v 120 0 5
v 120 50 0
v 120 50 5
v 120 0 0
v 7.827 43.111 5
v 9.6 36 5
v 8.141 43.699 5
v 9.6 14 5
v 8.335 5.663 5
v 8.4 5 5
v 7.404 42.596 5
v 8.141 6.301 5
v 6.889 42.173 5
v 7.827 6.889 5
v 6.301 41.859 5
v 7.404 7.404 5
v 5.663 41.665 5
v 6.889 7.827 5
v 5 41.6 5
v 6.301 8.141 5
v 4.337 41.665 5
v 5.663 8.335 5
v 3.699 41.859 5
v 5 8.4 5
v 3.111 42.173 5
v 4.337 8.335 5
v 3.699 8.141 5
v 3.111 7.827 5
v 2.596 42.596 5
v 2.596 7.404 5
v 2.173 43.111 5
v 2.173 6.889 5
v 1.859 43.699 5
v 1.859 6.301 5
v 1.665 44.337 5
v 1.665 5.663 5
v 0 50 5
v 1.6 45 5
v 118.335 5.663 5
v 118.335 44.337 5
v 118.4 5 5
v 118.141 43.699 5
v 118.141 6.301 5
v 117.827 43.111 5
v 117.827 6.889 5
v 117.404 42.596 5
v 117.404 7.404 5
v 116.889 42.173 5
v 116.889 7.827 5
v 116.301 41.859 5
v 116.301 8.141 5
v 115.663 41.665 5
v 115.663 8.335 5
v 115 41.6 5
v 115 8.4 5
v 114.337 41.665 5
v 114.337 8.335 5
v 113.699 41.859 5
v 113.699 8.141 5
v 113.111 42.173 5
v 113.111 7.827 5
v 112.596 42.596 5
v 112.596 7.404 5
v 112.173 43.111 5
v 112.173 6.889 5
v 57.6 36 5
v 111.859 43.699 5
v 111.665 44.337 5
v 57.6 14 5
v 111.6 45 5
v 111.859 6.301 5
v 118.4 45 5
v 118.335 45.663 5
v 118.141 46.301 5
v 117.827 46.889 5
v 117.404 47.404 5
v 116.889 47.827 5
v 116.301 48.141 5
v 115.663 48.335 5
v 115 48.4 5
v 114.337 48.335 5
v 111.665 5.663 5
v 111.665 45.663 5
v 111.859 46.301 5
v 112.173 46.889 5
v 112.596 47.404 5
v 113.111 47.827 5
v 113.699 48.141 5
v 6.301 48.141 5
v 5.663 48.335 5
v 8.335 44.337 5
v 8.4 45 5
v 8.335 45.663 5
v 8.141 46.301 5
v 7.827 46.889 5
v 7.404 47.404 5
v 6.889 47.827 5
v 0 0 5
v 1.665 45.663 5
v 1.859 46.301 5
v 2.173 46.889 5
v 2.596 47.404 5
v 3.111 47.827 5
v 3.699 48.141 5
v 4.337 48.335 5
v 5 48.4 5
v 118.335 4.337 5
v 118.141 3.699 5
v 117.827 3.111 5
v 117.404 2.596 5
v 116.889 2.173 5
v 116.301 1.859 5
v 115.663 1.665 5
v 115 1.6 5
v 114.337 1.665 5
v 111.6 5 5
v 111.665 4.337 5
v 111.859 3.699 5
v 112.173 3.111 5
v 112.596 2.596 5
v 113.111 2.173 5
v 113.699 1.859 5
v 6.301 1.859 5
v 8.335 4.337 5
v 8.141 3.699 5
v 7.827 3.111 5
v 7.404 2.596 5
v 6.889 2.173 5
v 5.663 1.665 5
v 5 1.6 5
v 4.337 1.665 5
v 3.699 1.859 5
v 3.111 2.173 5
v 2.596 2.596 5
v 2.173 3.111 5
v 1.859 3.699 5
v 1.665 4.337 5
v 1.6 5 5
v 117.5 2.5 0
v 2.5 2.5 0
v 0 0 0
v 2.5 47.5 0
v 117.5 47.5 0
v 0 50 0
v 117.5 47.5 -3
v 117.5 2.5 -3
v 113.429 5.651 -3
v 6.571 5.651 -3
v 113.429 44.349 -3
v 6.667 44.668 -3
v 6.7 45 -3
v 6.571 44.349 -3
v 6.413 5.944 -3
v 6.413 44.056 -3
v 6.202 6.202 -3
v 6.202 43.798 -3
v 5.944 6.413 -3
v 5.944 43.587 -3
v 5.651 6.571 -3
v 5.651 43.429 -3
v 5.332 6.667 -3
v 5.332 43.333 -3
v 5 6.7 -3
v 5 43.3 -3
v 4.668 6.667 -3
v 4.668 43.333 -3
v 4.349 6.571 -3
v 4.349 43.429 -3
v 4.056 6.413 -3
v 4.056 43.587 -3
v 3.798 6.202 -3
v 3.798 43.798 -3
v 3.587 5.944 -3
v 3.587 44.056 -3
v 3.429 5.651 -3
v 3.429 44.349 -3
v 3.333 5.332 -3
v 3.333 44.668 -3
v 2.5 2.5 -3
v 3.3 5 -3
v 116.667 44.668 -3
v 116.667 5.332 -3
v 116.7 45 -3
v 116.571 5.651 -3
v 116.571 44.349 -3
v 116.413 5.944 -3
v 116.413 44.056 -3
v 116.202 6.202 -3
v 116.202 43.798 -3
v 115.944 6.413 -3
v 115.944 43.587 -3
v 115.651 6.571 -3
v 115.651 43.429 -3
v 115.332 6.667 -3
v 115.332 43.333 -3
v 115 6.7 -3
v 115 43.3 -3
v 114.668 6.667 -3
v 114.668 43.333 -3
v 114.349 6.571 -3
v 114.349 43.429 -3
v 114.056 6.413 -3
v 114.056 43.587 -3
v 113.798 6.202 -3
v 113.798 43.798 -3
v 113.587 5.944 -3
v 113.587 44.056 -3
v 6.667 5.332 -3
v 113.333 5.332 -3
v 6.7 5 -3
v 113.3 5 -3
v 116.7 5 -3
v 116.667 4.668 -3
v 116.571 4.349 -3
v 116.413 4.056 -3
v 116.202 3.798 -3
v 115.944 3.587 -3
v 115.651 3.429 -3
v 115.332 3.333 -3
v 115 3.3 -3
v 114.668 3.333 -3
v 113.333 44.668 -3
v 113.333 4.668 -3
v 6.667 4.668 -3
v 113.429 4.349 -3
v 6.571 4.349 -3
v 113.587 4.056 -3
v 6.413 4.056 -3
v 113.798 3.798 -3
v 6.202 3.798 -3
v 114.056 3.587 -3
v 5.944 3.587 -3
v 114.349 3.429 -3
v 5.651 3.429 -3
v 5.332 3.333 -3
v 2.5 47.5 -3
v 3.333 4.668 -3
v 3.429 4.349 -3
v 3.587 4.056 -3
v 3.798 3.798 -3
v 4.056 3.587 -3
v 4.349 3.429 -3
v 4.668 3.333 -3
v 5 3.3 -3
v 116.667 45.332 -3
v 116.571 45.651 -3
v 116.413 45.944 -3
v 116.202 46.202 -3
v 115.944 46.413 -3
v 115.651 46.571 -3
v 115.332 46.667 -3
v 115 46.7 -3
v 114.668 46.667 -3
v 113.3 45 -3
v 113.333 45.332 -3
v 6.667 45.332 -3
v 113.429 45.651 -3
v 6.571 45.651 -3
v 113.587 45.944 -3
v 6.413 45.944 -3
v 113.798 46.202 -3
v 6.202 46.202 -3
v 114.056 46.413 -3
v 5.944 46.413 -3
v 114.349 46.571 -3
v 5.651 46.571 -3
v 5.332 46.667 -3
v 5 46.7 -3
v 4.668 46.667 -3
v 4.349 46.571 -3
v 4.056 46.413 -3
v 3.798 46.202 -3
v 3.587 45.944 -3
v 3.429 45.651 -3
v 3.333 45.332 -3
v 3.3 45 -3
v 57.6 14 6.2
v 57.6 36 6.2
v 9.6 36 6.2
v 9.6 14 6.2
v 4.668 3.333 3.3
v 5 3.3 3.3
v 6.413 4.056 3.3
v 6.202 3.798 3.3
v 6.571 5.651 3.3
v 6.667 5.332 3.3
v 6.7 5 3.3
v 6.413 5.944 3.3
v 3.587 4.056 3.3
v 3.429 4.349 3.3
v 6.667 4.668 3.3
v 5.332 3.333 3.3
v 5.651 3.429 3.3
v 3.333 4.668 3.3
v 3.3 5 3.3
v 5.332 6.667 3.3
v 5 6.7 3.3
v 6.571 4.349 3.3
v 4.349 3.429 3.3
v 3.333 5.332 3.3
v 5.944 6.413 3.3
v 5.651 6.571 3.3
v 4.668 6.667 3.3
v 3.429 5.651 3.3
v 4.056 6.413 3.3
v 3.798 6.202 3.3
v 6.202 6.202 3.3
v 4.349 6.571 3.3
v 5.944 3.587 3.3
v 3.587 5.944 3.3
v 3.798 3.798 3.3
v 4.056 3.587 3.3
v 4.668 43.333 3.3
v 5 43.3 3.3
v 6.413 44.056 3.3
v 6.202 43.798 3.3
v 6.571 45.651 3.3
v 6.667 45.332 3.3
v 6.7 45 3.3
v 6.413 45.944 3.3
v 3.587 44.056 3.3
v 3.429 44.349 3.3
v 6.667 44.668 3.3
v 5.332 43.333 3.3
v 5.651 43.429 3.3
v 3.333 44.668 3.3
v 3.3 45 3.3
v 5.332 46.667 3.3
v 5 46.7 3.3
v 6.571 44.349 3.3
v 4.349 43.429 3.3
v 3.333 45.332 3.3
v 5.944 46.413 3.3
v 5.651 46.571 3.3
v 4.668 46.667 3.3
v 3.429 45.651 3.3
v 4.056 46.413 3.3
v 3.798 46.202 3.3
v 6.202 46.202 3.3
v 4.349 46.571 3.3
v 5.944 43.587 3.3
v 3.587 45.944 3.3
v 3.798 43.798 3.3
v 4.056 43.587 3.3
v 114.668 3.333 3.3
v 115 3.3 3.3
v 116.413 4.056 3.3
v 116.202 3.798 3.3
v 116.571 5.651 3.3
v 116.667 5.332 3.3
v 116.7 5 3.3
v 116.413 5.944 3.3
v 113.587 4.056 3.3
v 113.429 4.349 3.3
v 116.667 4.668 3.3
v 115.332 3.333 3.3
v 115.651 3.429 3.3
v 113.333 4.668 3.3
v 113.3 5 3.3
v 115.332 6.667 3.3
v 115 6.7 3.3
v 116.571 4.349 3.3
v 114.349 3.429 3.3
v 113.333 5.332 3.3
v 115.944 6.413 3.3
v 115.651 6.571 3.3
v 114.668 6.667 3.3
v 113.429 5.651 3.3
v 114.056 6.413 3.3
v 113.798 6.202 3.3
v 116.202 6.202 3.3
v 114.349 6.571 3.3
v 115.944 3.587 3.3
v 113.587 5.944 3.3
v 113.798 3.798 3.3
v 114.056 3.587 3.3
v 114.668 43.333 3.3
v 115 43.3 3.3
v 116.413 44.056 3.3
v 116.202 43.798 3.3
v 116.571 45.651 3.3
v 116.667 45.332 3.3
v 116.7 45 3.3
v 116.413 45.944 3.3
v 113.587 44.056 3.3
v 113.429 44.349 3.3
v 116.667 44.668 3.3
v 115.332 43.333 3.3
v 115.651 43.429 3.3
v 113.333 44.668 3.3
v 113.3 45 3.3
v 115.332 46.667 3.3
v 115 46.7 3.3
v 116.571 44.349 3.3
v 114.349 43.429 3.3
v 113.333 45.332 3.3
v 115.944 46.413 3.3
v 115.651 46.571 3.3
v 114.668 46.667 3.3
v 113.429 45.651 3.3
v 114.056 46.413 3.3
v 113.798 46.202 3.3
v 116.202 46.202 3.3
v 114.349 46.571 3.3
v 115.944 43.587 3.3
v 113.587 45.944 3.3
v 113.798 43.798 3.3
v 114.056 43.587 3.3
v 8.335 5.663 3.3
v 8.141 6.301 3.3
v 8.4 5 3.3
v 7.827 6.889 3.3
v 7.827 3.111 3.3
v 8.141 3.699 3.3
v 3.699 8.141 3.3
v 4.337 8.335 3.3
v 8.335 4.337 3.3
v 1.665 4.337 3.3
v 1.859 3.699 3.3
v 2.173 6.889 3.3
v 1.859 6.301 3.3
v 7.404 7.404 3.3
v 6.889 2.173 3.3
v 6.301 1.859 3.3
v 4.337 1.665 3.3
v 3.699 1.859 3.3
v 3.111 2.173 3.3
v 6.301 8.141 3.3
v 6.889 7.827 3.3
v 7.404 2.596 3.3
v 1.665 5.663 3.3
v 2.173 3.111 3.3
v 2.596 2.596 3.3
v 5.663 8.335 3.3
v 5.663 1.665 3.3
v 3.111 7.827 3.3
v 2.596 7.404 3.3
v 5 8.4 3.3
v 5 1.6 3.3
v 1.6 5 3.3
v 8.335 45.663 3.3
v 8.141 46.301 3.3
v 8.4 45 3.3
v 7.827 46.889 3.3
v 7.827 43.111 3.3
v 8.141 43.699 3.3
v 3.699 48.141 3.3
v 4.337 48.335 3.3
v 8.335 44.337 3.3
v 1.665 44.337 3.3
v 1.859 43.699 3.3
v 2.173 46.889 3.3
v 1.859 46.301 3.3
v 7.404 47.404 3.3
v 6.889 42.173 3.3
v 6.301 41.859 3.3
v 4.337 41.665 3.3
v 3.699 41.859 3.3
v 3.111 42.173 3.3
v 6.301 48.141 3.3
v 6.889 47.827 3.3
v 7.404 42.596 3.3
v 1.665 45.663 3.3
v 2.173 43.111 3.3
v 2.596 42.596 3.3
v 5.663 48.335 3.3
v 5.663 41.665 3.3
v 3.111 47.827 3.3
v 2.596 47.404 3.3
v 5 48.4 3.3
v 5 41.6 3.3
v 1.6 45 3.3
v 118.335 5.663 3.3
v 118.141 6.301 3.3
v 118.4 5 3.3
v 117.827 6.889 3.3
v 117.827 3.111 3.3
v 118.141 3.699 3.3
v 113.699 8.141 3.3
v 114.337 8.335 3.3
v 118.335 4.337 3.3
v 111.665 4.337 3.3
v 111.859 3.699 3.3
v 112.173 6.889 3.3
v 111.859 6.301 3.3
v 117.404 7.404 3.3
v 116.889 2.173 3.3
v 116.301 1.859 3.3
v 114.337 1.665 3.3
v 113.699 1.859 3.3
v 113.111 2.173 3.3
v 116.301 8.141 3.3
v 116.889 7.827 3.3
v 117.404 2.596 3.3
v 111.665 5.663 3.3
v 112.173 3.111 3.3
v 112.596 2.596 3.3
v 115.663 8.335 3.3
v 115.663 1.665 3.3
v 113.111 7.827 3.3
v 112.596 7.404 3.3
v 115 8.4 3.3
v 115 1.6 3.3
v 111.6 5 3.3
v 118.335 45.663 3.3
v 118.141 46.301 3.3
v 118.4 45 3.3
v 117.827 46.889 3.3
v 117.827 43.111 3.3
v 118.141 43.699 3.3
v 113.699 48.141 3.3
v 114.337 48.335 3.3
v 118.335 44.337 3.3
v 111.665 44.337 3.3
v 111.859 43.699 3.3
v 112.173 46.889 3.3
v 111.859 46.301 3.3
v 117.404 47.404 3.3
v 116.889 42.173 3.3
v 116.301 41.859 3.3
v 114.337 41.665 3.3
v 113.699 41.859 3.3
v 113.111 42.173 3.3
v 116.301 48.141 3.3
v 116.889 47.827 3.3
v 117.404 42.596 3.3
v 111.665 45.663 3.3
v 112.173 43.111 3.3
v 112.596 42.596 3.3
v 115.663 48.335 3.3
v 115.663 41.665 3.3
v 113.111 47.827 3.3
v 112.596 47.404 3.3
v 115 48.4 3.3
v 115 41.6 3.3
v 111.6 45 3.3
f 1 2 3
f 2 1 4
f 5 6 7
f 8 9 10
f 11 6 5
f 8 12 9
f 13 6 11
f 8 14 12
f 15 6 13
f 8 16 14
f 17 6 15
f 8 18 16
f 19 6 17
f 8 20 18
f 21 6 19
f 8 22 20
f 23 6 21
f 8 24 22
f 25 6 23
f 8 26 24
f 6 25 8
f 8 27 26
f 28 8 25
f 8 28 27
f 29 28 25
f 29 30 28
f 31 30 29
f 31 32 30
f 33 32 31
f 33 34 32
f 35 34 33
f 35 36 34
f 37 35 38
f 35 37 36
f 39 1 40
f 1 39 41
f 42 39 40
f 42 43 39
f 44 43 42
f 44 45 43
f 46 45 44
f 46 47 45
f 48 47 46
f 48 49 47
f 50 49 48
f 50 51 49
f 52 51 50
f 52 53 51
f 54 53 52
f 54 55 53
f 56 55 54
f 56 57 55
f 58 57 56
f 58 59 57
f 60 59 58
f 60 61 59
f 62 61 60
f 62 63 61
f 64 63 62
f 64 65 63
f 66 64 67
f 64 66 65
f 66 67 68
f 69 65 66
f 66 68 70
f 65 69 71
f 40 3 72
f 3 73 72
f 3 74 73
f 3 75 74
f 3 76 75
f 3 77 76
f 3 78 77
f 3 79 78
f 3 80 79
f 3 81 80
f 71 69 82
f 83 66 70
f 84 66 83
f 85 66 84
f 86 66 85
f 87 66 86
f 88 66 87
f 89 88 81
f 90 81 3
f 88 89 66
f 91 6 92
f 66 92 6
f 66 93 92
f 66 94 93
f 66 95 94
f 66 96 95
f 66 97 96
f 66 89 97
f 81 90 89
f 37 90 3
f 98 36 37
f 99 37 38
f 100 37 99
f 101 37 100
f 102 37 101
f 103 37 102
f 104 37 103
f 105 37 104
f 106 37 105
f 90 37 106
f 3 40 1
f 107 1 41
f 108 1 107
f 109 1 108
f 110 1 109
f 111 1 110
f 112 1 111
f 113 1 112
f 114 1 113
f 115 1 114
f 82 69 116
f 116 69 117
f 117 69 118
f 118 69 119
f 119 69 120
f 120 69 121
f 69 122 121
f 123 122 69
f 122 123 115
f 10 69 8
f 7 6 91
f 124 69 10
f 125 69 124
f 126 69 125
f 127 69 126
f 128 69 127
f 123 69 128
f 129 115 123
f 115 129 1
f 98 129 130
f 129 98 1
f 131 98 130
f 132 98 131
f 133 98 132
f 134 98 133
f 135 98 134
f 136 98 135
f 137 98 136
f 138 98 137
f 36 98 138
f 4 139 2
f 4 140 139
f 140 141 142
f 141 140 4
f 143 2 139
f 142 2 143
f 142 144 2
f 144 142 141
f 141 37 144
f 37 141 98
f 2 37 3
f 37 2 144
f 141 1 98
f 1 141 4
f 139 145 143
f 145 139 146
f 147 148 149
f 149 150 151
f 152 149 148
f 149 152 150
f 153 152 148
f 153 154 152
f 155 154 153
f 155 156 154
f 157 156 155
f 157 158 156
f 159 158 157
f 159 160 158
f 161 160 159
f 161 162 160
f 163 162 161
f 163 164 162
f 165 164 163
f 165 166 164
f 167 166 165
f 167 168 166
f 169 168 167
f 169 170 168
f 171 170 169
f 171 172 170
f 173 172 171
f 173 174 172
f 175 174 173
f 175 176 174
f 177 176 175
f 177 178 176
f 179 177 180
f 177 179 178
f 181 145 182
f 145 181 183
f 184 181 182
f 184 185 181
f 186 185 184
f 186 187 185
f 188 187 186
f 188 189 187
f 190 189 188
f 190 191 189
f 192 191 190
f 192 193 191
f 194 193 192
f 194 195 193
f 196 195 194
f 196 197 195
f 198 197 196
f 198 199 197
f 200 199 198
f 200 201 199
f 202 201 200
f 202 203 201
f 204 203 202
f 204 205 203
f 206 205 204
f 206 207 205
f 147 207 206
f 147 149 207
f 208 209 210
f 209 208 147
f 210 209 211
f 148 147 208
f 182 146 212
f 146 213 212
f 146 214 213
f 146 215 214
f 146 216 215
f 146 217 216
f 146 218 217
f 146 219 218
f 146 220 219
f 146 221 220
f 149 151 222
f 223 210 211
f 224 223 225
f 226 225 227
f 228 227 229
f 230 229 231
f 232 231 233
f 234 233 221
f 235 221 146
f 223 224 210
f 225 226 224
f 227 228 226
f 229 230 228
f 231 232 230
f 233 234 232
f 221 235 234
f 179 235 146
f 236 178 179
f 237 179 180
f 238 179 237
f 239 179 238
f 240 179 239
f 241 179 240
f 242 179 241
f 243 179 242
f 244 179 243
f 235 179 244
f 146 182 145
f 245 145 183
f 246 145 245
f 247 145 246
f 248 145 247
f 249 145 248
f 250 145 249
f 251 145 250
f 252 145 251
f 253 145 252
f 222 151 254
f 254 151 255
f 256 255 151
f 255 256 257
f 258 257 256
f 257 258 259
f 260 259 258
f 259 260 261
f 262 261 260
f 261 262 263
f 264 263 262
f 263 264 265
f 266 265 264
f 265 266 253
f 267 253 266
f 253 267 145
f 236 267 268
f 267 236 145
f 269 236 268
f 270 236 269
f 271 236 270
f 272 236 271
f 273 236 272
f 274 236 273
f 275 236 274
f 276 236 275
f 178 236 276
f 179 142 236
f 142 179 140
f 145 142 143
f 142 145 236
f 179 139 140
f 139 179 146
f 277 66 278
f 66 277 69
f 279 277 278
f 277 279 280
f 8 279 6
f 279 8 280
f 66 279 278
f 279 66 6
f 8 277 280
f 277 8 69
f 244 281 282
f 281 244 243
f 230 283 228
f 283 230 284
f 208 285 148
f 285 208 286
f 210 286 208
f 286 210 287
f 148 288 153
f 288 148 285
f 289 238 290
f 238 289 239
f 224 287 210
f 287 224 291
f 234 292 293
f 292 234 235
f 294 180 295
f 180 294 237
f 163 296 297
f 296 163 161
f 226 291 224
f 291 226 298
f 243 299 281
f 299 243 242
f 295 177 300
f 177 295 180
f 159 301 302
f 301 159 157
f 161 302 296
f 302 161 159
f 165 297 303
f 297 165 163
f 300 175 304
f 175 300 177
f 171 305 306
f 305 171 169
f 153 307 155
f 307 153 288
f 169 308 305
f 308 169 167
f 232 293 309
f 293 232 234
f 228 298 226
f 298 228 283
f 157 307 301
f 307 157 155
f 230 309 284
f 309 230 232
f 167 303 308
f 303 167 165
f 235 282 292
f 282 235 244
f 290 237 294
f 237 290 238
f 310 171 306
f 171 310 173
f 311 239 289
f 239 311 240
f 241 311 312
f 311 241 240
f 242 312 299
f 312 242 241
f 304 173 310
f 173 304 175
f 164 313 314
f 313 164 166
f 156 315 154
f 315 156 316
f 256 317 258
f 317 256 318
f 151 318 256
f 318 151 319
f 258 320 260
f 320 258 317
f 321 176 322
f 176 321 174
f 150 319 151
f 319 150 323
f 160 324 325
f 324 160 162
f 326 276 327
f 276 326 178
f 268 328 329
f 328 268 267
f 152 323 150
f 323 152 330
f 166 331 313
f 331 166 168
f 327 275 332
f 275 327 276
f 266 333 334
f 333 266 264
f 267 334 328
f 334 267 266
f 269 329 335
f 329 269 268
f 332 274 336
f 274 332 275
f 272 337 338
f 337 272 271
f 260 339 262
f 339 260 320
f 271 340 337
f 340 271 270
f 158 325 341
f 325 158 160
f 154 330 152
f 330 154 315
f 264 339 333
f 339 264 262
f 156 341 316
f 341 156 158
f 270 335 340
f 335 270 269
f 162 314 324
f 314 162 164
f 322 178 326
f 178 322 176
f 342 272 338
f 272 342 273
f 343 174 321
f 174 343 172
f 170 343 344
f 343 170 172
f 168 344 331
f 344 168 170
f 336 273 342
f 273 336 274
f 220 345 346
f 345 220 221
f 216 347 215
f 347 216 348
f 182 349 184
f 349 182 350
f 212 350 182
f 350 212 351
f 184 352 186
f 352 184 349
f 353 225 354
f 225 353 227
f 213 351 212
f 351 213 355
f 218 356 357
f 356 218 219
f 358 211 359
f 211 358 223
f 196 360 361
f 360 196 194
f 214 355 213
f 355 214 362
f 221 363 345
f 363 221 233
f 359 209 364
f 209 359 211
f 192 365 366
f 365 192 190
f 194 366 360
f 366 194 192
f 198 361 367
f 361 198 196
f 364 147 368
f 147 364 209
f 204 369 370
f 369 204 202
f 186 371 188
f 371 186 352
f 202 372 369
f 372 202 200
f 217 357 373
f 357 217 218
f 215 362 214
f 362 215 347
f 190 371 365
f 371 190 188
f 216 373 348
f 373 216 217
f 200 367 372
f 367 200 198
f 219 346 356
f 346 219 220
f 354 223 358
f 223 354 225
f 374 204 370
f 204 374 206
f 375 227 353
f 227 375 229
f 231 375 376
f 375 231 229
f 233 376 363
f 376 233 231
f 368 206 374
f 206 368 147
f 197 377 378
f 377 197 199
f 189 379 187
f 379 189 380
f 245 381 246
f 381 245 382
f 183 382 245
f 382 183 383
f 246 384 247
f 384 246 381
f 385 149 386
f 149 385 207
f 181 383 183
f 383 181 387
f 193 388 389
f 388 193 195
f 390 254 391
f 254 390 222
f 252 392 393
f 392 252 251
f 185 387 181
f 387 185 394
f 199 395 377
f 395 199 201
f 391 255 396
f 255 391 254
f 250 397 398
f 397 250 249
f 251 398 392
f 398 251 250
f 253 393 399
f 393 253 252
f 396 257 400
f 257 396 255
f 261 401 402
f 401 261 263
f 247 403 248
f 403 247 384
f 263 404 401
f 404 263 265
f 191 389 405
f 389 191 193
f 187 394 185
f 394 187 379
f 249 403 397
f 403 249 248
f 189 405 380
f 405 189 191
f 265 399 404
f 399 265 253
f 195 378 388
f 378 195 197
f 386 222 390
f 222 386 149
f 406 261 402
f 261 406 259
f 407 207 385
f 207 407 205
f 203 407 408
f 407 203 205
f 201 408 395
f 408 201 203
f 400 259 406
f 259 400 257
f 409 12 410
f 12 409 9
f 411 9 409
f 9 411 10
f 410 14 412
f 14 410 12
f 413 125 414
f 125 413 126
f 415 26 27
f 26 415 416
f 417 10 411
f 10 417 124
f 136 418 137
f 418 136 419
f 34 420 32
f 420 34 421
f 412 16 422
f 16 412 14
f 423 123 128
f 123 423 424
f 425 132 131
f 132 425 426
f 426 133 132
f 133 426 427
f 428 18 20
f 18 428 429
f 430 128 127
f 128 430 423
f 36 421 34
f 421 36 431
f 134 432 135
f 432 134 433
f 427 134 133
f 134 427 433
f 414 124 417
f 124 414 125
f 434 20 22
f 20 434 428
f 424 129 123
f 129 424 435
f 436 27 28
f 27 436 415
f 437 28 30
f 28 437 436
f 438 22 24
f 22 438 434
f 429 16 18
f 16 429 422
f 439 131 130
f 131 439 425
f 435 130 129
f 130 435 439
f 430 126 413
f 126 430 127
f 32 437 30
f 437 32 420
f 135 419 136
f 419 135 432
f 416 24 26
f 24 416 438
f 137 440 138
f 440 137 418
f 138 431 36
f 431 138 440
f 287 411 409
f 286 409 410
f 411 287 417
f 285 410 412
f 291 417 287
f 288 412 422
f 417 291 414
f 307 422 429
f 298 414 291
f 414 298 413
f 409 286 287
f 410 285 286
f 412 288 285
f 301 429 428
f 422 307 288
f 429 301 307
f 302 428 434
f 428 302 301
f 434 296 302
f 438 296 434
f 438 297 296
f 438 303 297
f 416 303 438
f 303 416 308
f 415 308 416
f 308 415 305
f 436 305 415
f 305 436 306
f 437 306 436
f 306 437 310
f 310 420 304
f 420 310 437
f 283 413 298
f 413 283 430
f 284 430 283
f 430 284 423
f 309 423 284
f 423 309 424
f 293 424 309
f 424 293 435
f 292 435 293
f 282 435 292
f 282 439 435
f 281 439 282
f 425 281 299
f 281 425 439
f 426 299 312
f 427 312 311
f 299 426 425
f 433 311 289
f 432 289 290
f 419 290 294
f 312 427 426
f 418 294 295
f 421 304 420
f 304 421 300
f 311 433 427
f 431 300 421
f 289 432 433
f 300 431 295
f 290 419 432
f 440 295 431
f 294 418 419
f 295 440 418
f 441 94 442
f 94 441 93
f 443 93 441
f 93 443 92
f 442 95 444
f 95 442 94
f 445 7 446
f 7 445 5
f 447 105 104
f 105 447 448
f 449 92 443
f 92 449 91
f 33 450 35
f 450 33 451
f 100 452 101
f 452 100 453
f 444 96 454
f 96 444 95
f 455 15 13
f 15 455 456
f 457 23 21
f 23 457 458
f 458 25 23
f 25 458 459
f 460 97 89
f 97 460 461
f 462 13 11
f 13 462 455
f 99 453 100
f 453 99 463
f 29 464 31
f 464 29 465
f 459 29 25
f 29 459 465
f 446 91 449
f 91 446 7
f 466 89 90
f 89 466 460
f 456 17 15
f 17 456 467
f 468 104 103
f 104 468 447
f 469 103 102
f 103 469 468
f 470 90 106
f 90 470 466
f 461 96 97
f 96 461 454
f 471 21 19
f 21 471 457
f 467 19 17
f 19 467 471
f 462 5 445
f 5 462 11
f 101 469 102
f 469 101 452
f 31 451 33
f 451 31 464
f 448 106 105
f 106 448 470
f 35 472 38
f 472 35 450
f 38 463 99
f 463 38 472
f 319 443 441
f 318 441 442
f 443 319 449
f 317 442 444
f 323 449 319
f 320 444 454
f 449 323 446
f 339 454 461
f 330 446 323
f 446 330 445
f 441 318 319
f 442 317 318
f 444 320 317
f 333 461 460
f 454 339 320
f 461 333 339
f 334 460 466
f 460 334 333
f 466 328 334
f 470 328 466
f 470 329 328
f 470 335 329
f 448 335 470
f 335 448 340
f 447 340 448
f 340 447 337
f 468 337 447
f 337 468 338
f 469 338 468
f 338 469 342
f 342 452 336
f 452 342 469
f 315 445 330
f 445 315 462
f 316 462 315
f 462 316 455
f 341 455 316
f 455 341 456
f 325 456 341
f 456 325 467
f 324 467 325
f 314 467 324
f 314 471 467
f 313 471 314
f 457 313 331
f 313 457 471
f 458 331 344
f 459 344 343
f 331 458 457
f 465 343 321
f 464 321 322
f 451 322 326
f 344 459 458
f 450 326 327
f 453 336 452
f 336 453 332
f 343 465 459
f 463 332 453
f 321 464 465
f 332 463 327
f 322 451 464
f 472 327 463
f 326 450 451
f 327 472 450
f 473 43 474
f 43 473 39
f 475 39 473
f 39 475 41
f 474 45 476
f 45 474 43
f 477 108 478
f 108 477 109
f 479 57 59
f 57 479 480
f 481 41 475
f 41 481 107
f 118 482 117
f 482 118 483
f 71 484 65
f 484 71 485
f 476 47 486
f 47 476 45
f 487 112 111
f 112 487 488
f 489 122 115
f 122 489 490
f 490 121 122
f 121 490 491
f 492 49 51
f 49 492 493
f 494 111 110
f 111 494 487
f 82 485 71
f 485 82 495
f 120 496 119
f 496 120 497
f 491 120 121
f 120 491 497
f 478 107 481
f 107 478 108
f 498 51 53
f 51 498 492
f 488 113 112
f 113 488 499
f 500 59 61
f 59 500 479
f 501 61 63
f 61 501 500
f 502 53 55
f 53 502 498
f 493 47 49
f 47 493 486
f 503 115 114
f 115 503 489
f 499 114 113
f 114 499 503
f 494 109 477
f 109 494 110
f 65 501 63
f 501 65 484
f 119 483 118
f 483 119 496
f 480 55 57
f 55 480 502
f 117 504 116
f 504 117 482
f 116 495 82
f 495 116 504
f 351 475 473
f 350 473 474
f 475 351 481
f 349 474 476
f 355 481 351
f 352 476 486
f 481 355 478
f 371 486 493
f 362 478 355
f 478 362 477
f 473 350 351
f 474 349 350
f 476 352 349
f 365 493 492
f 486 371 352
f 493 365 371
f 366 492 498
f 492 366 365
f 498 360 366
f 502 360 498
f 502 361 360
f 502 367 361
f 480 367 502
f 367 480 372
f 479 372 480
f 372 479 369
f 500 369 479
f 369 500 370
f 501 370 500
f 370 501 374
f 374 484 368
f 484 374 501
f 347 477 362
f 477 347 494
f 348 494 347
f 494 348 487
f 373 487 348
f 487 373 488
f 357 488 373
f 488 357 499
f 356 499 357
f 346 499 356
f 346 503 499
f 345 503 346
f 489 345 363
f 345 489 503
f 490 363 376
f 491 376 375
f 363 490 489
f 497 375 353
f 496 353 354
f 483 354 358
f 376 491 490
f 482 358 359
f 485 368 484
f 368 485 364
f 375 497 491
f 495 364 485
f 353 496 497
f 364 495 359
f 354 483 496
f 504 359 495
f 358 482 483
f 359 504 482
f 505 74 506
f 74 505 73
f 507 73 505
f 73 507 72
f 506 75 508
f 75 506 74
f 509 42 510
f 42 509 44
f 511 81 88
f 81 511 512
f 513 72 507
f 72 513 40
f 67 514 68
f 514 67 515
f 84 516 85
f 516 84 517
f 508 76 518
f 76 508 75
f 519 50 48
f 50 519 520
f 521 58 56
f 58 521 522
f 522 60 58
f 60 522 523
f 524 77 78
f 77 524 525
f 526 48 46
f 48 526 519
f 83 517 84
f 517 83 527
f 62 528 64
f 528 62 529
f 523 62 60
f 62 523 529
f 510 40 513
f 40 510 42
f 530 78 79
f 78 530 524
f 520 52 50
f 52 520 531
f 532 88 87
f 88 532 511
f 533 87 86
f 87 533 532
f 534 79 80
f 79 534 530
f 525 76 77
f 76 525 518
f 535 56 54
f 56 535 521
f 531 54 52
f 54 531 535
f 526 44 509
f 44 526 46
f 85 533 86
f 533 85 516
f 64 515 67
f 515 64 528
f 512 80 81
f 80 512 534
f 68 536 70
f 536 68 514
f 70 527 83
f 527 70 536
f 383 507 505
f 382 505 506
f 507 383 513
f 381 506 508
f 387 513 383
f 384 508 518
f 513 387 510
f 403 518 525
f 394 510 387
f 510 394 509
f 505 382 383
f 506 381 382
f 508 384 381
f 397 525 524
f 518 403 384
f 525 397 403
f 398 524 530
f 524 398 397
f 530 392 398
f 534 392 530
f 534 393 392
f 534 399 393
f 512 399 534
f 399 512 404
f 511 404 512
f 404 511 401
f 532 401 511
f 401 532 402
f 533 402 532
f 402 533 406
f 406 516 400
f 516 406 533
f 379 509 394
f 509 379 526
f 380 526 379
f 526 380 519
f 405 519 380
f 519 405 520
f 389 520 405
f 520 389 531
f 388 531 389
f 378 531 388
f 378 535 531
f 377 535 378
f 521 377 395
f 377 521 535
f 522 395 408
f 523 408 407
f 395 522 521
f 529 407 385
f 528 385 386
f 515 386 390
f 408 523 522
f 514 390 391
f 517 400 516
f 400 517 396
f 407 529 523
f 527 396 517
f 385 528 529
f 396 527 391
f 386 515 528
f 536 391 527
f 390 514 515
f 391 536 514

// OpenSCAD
$fn = 32;

// ----------------------------------------------------------------------
// Enclosure lid: 120 x 50 x 5 mm, 4 bolt holes
// ----------------------------------------------------------------------

// --- parameters (mm) ---
length = 120;             // lid length, X
width = 50;               // lid width, Y
plate_t = 5;              // lid plate thickness
bolt_d = 3.4;             // bolt clearance
boss_lip = 5;             // bolt hole inset from the corner
sink = 1;                 // overlap of the lip and ribs into the plate
lip_h = 4;                // lip height below the plate
lip_wall = 2.5;           // lip wall thickness
cs_d = 6.8;               // countersink diameter
cs_h = 1.7;               // countersink depth
label_h = 1.2;            // raised marking pad

module plate() {
  cube([length, width, plate_t]);
  /* lip that drops into the housing opening, sunk into the plate */
  translate([lip_wall, lip_wall, -lip_h + sink]) cube([length - 2 * lip_wall, width - 2 * lip_wall, lip_h]);
  /* raised marking pad on top, sunk 1 mm into the plate */
  translate([length * 0.08, width * 0.28, plate_t - 1]) cube([length * 0.4, width * 0.44, label_h + 1]);
}

difference() {
  plate();
  /* bolt pattern matching the corner bosses */
  for (sx = [0, 1]) for (sy = [0, 1])
    translate([sx * (length - 2 * boss_lip) + boss_lip, sy * (width - 2 * boss_lip) + boss_lip, -lip_h - 1])
      cylinder(h = plate_t + lip_h + 2, d = bolt_d);
  /* countersinks so the heads sit flush */
  for (sx = [0, 1]) for (sy = [0, 1])
    translate([sx * (length - 2 * boss_lip) + boss_lip, sy * (width - 2 * boss_lip) + boss_lip, plate_t - cs_h])
      cylinder(h = cs_h + 0.5, d = cs_d);
}
